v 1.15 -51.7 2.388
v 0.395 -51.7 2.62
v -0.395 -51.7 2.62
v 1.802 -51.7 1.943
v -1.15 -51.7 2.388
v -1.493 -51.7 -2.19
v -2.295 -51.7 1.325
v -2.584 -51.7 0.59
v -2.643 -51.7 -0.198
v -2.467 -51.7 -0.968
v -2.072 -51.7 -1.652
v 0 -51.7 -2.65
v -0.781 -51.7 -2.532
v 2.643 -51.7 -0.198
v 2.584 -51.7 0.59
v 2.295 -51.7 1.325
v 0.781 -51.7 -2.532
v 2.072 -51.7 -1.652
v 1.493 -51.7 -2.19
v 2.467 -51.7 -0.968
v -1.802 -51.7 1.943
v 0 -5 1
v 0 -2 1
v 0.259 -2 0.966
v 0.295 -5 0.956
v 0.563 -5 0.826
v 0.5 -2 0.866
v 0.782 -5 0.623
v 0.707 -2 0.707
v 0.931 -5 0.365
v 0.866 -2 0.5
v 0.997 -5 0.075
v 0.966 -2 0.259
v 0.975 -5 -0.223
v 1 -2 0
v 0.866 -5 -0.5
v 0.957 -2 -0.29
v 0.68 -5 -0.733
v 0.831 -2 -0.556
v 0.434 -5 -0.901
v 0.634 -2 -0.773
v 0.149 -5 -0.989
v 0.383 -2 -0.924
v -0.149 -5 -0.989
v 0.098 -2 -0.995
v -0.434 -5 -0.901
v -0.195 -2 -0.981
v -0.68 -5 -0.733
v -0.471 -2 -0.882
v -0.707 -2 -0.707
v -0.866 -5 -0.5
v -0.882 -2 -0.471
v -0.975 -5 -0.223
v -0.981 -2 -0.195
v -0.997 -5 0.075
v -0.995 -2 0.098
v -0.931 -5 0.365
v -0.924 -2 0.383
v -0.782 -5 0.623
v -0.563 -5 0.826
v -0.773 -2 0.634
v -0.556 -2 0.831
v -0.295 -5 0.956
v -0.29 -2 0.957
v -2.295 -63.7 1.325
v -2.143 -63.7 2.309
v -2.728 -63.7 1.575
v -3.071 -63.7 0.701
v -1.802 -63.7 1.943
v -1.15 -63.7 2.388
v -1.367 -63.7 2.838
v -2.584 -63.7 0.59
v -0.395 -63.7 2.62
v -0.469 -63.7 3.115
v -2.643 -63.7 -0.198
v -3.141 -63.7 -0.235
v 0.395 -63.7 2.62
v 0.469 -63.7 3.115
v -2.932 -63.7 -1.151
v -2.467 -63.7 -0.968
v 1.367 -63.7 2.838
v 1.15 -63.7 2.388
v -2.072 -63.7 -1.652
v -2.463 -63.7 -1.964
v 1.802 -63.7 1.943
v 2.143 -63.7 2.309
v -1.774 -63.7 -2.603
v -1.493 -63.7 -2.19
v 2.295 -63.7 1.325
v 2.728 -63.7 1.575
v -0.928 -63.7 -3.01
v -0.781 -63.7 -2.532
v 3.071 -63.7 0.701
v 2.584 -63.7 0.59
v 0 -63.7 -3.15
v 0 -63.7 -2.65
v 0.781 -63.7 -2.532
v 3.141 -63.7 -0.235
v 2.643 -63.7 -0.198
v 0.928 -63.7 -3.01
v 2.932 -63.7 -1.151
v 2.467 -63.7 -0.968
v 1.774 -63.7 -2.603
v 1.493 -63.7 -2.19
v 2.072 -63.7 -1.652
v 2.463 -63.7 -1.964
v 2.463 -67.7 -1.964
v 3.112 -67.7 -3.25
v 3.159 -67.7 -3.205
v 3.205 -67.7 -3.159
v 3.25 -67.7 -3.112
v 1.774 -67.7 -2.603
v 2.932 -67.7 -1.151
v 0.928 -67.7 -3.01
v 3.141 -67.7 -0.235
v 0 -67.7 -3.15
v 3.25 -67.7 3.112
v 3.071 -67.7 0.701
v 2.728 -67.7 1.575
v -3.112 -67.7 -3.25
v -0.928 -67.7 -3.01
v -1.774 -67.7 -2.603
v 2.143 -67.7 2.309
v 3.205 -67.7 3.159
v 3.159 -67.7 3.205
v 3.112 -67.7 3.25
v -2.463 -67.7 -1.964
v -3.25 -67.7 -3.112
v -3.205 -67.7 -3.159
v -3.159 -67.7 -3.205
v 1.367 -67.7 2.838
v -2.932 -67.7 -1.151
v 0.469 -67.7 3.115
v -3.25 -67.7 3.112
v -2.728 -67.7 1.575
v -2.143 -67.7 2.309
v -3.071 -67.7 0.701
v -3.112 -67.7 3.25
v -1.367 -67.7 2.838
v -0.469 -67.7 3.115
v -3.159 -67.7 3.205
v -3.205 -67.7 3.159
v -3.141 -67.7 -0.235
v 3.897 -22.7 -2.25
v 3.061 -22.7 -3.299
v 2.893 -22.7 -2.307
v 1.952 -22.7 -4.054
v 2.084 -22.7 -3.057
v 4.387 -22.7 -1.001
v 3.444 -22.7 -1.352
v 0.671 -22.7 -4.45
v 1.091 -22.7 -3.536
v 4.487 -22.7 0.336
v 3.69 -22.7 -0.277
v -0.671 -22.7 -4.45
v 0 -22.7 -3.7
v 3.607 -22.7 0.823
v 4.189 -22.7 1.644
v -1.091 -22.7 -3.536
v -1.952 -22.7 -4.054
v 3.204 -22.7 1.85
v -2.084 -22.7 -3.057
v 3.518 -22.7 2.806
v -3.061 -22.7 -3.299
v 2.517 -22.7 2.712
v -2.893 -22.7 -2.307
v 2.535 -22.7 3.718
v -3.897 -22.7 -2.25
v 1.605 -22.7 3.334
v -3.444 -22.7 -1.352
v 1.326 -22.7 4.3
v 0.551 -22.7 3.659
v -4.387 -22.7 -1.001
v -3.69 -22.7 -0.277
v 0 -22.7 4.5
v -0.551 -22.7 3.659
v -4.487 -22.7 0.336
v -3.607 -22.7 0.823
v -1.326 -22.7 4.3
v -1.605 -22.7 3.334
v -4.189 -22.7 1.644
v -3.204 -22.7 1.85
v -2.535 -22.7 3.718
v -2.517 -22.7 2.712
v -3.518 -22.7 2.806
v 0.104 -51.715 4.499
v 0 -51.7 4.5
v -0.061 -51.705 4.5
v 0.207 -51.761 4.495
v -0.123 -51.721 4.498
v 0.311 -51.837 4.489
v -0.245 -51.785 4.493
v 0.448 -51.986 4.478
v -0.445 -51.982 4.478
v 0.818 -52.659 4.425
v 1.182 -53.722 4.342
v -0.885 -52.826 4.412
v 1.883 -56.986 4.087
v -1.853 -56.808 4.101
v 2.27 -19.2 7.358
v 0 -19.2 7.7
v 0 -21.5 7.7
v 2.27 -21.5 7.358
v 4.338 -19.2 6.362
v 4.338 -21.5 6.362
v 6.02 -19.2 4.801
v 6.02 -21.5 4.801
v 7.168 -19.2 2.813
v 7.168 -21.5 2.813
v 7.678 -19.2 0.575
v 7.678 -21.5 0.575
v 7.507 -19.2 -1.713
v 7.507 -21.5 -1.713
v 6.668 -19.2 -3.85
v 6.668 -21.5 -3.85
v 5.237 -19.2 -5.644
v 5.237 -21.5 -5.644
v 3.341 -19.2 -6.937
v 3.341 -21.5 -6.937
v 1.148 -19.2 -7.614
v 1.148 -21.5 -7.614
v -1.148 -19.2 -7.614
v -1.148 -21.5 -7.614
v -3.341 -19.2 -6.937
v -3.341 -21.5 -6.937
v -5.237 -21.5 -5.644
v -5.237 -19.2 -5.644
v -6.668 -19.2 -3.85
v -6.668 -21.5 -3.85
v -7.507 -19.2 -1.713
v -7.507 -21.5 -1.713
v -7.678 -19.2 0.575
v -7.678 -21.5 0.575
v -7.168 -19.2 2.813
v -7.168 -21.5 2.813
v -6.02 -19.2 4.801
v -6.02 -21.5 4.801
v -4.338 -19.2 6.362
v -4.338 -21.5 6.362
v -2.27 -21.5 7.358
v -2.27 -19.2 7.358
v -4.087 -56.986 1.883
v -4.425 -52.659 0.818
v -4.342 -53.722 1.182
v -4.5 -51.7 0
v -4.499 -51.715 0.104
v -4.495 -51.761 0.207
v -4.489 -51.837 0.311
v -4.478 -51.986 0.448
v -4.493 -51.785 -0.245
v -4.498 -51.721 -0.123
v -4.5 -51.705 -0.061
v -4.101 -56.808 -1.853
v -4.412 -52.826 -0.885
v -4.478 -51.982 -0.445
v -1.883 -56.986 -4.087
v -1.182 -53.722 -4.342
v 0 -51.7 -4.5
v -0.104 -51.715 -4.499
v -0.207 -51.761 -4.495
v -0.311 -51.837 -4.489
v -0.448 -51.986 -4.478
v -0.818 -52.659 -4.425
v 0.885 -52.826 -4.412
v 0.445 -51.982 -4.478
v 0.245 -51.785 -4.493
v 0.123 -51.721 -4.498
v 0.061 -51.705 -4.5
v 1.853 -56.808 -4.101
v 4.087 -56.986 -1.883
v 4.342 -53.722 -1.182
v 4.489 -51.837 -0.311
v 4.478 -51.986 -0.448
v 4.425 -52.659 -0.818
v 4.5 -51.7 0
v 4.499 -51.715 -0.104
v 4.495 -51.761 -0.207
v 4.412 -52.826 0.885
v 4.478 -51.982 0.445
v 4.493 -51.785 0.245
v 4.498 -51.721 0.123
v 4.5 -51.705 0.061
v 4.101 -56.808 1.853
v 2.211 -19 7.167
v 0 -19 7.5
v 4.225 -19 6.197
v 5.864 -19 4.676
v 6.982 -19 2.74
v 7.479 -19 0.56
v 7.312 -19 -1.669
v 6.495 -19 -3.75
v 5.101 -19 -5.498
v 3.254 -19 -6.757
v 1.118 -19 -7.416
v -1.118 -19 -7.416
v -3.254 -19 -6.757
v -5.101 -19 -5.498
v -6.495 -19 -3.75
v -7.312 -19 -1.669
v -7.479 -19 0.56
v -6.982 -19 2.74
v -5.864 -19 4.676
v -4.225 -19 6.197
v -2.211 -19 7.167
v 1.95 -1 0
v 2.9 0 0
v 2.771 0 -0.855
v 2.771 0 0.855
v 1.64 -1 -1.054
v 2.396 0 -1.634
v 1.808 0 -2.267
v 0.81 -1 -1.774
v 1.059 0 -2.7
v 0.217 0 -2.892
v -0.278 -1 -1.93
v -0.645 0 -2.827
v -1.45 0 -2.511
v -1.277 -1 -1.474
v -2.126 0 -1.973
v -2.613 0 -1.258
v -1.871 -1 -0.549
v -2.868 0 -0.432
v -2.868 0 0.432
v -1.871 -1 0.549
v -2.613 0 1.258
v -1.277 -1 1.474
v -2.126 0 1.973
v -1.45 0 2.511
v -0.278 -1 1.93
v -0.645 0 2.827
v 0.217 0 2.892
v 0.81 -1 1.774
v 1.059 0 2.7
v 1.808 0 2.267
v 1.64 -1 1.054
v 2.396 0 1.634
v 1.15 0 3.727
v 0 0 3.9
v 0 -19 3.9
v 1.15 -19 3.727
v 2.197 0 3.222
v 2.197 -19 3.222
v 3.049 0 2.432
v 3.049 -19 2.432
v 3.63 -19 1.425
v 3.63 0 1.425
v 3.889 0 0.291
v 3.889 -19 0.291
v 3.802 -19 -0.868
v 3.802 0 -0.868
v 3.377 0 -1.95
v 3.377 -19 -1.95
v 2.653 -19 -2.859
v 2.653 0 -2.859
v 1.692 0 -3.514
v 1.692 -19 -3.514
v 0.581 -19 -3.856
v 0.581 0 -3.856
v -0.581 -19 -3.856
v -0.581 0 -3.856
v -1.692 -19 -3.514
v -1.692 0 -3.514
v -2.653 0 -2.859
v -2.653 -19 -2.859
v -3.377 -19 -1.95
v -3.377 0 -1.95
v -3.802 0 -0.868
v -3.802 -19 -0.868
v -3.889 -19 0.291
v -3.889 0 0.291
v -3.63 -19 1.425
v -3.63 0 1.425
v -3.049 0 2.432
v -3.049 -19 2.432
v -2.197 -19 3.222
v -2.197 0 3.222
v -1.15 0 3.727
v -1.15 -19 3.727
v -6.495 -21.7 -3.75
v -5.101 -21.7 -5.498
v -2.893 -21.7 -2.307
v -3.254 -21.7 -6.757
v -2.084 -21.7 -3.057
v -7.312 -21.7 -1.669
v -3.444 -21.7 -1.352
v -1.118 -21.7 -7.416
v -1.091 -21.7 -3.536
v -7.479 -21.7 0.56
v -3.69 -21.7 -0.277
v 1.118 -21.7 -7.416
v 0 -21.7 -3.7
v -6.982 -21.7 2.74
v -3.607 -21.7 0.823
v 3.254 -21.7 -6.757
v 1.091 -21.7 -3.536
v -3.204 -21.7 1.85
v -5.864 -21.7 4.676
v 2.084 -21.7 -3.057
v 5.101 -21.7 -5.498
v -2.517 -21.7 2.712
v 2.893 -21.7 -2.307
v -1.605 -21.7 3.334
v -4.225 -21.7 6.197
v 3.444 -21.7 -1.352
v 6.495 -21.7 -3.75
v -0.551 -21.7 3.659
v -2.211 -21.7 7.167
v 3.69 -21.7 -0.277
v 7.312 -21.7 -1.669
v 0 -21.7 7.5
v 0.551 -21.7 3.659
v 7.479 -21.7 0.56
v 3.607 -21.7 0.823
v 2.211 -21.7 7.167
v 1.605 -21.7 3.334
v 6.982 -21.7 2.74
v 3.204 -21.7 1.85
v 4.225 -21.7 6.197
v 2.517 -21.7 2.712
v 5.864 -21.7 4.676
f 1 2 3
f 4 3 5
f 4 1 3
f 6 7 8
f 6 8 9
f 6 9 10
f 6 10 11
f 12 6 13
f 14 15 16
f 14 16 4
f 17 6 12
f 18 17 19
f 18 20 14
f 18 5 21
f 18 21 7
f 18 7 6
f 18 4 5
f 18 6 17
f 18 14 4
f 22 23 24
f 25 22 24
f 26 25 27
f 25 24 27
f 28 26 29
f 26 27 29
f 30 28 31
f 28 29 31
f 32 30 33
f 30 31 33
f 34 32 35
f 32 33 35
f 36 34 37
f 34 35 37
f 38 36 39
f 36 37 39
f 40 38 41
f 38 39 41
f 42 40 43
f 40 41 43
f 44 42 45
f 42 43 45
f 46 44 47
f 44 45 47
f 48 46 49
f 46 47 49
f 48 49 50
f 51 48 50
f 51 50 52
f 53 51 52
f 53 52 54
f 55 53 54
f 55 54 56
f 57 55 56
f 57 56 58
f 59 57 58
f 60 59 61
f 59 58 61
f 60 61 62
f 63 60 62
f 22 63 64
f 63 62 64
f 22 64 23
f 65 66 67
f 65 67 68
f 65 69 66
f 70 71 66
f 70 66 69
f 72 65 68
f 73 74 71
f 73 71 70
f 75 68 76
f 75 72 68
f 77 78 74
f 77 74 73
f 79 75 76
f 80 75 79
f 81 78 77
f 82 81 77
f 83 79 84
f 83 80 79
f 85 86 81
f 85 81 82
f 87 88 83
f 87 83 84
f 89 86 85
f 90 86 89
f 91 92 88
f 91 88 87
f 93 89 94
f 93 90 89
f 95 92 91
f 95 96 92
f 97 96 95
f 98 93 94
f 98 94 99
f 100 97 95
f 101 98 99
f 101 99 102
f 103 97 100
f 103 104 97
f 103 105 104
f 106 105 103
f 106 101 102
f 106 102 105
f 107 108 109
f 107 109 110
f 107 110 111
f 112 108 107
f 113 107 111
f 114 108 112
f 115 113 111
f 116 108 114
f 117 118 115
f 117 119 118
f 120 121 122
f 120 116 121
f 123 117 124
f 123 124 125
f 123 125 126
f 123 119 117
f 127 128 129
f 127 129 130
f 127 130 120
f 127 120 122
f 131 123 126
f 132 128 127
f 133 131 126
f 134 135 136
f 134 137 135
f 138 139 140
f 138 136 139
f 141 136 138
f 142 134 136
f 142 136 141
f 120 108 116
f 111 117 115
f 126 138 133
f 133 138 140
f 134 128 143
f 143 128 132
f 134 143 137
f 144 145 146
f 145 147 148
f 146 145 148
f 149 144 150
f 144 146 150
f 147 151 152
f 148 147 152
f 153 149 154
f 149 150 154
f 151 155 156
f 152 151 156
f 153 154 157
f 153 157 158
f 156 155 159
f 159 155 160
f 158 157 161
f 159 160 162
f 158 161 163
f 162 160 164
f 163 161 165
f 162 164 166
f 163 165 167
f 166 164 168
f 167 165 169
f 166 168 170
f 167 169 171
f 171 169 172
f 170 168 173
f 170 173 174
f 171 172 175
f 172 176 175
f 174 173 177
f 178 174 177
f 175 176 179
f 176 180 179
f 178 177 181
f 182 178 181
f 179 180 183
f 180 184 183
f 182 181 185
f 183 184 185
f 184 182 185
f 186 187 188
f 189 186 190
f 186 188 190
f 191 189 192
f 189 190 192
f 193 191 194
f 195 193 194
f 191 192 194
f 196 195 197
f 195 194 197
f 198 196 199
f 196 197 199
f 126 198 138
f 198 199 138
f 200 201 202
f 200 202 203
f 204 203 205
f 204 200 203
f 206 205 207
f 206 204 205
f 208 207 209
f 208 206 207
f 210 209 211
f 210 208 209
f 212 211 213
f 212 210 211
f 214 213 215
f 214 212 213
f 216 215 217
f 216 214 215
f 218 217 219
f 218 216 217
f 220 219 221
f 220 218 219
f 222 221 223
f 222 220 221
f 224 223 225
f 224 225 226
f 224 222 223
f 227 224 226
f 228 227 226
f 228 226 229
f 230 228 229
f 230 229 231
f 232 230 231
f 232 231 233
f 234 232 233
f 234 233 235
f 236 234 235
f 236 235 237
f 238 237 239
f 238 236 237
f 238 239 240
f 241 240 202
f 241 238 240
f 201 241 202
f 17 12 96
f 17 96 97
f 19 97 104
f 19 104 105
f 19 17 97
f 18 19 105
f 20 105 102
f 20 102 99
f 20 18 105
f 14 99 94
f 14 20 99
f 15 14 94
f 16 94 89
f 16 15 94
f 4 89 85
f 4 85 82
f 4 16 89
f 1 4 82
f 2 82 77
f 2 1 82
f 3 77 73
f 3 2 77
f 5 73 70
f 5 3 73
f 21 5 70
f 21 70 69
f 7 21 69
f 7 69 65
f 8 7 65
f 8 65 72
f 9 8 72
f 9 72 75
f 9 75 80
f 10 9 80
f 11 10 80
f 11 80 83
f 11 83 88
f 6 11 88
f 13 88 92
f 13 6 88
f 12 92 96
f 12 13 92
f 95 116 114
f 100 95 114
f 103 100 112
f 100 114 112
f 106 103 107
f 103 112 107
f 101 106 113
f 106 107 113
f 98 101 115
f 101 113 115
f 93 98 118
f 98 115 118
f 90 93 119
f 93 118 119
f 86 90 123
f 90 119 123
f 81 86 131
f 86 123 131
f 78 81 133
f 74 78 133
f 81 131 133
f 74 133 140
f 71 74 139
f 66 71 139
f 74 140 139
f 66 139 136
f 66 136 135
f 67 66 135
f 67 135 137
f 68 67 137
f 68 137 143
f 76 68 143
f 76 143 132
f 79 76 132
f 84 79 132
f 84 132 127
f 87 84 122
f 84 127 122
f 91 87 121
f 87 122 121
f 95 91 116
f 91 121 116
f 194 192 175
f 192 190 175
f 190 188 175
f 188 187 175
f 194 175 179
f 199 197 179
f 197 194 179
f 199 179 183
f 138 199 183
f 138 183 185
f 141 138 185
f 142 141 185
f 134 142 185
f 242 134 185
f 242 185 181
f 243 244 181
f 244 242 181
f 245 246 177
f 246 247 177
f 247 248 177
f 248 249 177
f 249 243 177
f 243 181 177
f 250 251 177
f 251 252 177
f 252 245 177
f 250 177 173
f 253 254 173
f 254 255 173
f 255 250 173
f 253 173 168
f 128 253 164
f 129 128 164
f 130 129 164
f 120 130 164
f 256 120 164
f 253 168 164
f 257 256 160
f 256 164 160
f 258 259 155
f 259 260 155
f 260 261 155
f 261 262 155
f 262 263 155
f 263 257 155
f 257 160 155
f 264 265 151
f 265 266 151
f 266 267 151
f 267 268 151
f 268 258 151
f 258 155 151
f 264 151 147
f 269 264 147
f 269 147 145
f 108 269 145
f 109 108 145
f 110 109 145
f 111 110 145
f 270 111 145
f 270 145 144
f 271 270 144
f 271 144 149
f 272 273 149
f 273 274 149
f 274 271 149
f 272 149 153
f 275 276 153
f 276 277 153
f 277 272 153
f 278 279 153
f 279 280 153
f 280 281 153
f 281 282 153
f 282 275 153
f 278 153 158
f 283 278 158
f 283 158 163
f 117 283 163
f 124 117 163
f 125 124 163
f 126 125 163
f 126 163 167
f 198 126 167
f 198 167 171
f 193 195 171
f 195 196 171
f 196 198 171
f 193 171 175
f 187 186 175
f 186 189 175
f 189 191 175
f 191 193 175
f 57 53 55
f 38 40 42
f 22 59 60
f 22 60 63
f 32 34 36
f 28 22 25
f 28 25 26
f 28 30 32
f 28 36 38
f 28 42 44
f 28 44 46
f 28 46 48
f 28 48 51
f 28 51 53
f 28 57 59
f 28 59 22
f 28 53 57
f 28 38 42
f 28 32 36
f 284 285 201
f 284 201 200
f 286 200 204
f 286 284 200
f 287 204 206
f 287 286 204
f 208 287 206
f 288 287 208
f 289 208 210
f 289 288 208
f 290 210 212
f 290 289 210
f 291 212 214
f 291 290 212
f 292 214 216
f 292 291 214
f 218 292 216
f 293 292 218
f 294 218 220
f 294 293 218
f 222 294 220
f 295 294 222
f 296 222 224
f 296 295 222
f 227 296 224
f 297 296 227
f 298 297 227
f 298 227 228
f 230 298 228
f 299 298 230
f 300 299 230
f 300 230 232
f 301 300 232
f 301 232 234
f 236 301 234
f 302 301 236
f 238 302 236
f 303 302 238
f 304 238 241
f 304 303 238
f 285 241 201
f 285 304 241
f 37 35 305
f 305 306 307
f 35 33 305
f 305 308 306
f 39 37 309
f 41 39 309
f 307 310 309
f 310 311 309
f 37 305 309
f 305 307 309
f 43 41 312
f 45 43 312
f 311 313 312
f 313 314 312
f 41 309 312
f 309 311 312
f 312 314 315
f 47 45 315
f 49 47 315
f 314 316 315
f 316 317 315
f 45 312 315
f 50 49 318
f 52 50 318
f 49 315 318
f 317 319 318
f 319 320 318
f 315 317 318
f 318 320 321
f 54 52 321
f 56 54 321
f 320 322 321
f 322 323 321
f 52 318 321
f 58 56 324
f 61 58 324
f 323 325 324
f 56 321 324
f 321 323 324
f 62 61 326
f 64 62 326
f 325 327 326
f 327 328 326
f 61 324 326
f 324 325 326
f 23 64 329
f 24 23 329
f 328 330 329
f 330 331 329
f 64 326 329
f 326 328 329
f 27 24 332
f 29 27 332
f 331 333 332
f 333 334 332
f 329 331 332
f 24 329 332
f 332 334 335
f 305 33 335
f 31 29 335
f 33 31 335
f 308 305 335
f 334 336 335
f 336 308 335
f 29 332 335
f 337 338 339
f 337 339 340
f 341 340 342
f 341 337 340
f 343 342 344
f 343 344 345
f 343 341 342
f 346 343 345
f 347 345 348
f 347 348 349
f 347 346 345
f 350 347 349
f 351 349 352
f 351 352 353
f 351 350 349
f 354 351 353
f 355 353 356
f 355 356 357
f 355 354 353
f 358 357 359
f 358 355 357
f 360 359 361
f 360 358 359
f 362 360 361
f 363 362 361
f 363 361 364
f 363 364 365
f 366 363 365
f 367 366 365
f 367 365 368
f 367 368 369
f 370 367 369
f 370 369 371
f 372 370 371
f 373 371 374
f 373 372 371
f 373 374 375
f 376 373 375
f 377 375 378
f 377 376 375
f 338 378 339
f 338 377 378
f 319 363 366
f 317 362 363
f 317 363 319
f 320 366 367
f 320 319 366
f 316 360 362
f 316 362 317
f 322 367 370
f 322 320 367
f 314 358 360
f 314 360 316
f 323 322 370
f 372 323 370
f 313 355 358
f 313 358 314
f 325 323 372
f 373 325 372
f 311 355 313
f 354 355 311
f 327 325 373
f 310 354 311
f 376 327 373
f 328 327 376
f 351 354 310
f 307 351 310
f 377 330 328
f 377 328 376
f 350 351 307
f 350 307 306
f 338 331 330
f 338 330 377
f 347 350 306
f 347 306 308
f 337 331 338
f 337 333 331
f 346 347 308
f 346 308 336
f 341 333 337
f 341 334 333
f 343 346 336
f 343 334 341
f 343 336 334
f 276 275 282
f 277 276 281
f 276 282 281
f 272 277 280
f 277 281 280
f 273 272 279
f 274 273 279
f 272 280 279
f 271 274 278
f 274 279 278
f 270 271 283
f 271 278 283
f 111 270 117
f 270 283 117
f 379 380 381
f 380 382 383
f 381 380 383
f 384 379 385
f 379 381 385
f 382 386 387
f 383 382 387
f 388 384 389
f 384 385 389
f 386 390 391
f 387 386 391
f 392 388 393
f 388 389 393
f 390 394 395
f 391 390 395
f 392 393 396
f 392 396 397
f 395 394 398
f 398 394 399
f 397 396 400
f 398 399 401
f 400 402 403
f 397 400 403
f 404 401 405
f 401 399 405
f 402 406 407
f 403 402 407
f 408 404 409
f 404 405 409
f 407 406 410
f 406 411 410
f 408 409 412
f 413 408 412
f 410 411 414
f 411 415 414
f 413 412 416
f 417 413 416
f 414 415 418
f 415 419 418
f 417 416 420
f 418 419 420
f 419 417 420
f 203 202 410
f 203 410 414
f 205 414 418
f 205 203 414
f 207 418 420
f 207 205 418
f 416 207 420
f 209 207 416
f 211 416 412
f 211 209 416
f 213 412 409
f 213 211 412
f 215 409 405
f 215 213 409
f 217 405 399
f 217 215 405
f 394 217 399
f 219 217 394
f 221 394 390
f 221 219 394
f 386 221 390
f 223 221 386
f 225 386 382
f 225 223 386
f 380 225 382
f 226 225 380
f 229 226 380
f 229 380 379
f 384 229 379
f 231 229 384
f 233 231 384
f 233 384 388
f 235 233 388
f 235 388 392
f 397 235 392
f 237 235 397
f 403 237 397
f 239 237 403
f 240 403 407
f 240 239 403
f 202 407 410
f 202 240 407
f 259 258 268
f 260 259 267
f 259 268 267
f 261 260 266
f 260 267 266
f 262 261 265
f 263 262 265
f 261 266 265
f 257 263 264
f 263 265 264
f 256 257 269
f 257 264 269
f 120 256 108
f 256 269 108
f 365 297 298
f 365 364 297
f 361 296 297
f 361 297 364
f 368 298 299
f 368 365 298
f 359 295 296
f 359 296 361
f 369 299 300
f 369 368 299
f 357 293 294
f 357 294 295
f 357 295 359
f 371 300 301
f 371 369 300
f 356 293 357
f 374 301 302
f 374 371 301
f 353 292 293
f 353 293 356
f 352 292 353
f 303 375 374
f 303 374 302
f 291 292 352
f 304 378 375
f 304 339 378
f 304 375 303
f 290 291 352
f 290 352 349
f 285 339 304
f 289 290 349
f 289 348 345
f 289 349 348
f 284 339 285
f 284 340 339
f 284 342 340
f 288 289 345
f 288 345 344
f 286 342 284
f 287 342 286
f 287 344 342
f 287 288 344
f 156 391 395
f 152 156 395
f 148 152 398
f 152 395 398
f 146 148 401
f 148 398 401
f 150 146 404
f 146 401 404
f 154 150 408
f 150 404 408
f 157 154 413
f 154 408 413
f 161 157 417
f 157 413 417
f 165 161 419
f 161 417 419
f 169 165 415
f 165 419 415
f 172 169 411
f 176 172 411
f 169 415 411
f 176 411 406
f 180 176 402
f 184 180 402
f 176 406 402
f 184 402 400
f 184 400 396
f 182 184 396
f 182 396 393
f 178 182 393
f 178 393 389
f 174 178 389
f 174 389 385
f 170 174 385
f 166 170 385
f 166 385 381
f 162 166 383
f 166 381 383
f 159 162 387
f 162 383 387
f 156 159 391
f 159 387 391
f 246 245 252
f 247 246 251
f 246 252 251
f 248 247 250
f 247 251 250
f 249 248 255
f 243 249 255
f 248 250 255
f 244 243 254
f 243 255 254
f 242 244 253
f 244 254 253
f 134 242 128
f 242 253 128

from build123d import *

# Parameters (mm, degrees)
SKETCH_1_R               = 3.9
EXTRUDE_1_DEPTH          = 19
SKETCH_3_R               = 7.7
EXTRUDE_2_DEPTH          = 2.7
SKETCH_4_R               = 3.7
EXTRUDE_3_DEPTH          = 1
SKETCH_5_R               = 4.5
EXTRUDE_4_DEPTH          = 45
CUT_EXTRUDE_1_DEPTH      = 14.75
PATTERN_CIRCULAR_1_COUNT = 4
SKETCH_10_R              = 3.15
CUT_EXTRUDE_2_DEPTH      = 4
CUT_EXTRUDE_START        = -12
SKETCH_11_R              = 2.65
CUT_EXTRUDE_3_DEPTH      = 12
SKETCH_13_R              = 1
SKETCH_12_R              = 2.9
SKETCH_13_2_R            = 1
CUT_EXTRUDE_4_DEPTH      = 3
CHAMFER_1_SIZE           = 0.2


with BuildPart() as part:
    # Эскиз1 → Бобышка-Вытянуть1 (new body)
    with BuildSketch(Plane(origin=(0, 0, 0), x_dir=(1, 0, 0), z_dir=(0, 1, 0))):
        with Locations(Location((0, 0, 0), (0, 0, 270))):
            Circle(SKETCH_1_R)
    extrude(amount=-EXTRUDE_1_DEPTH)

    # Эскиз3 → Бобышка-Вытянуть2 (add)
    with BuildSketch(Plane(origin=(0, -19, 0), x_dir=(1, 0, 0), z_dir=(0, 1, 0))):
        with Locations(Location((0, 0, 0), (0, 0, 270))):
            Circle(SKETCH_3_R)
    extrude(amount=-EXTRUDE_2_DEPTH)

    # Эскиз4 → Бобышка-Вытянуть3 (add)
    with BuildSketch(Plane(origin=(0, -21.7, 0), x_dir=(-1, 0, 0), z_dir=(0, -1, 0))):
        with Locations(Location((0, 0, 0), (0, 0, 90))):
            Circle(SKETCH_4_R)
    extrude(amount=EXTRUDE_3_DEPTH)

    # Эскиз5 → Бобышка-Вытянуть4 (add)
    with BuildSketch(Plane.XZ.offset(22.7)):
        with Locations(Location((0, 0, 0), (0, 0, 90))):
            Circle(SKETCH_5_R)
    extrude(amount=EXTRUDE_4_DEPTH)

    # Эскиз9 → Вырез-Вытянуть1 (cut, symmetric)
    with BuildSketch(Plane.XY):
        Polygon((4.5, -51.7), (3.25, -67.7), (4.5, -67.7), align=None)
    cut_extrude_1 = extrude(amount=CUT_EXTRUDE_1_DEPTH, both=True, mode=Mode.SUBTRACT)

    # Круговой массив1: Вырез-Вытянуть1 ×4 about axis
    pattern_circular_1_axis = Axis((0, 0, 0), (0, 1, 0))
    for i in range(1, PATTERN_CIRCULAR_1_COUNT):
        add(cut_extrude_1.rotate(pattern_circular_1_axis, i * 360 / PATTERN_CIRCULAR_1_COUNT), mode=Mode.SUBTRACT)

    # Эскиз10 → Вырез-Вытянуть2 (cut)
    with BuildSketch(Plane.XZ.offset(67.7)):
        with Locations(Location((0, 0, 0), (0, 0, 270))):
            Circle(SKETCH_10_R)
    extrude(amount=-CUT_EXTRUDE_2_DEPTH, mode=Mode.SUBTRACT)

    # Эскиз11 → Вырез-Вытянуть3 (cut)
    with BuildSketch(Plane.XZ.offset(63.7).offset(CUT_EXTRUDE_START)):
        with Locations(Location((0, 0, 0), (0, 0, 270))):
            Circle(SKETCH_11_R)
    extrude(amount=CUT_EXTRUDE_3_DEPTH, mode=Mode.SUBTRACT)

    # Эскиз13 → Вырез-По сечениям1 section 0
    with BuildSketch(Plane(origin=(0, -2, 0), x_dir=(1, 0, 0), z_dir=(0, 1, 0))):
        Circle(SKETCH_13_R)
    # Эскиз12 → Вырез-По сечениям1 section 1
    with BuildSketch(Plane(origin=(0, 0, 0), x_dir=(1, 0, 0), z_dir=(0, 1, 0))):
        Circle(SKETCH_12_R)
    loft(mode=Mode.SUBTRACT)

    # Эскиз13<2> → Вырез-Вытянуть4 (cut)
    with BuildSketch(Plane(origin=(0, -2, 0), x_dir=(1, 0, 0), z_dir=(0, 1, 0))):
        with Locations(Location((0, 0, 0), (0, 0, 270))):
            Circle(SKETCH_13_2_R)
    extrude(amount=-CUT_EXTRUDE_4_DEPTH, mode=Mode.SUBTRACT)

    # Фаска1
    chamfer_1_edges = [part.edges().sort_by_distance(p)[0] for p in [
        (0, -21.7, -7.7),
        (0, -19, -7.7),
    ]]
    chamfer(chamfer_1_edges, length=CHAMFER_1_SIZE)


solid = part.part
